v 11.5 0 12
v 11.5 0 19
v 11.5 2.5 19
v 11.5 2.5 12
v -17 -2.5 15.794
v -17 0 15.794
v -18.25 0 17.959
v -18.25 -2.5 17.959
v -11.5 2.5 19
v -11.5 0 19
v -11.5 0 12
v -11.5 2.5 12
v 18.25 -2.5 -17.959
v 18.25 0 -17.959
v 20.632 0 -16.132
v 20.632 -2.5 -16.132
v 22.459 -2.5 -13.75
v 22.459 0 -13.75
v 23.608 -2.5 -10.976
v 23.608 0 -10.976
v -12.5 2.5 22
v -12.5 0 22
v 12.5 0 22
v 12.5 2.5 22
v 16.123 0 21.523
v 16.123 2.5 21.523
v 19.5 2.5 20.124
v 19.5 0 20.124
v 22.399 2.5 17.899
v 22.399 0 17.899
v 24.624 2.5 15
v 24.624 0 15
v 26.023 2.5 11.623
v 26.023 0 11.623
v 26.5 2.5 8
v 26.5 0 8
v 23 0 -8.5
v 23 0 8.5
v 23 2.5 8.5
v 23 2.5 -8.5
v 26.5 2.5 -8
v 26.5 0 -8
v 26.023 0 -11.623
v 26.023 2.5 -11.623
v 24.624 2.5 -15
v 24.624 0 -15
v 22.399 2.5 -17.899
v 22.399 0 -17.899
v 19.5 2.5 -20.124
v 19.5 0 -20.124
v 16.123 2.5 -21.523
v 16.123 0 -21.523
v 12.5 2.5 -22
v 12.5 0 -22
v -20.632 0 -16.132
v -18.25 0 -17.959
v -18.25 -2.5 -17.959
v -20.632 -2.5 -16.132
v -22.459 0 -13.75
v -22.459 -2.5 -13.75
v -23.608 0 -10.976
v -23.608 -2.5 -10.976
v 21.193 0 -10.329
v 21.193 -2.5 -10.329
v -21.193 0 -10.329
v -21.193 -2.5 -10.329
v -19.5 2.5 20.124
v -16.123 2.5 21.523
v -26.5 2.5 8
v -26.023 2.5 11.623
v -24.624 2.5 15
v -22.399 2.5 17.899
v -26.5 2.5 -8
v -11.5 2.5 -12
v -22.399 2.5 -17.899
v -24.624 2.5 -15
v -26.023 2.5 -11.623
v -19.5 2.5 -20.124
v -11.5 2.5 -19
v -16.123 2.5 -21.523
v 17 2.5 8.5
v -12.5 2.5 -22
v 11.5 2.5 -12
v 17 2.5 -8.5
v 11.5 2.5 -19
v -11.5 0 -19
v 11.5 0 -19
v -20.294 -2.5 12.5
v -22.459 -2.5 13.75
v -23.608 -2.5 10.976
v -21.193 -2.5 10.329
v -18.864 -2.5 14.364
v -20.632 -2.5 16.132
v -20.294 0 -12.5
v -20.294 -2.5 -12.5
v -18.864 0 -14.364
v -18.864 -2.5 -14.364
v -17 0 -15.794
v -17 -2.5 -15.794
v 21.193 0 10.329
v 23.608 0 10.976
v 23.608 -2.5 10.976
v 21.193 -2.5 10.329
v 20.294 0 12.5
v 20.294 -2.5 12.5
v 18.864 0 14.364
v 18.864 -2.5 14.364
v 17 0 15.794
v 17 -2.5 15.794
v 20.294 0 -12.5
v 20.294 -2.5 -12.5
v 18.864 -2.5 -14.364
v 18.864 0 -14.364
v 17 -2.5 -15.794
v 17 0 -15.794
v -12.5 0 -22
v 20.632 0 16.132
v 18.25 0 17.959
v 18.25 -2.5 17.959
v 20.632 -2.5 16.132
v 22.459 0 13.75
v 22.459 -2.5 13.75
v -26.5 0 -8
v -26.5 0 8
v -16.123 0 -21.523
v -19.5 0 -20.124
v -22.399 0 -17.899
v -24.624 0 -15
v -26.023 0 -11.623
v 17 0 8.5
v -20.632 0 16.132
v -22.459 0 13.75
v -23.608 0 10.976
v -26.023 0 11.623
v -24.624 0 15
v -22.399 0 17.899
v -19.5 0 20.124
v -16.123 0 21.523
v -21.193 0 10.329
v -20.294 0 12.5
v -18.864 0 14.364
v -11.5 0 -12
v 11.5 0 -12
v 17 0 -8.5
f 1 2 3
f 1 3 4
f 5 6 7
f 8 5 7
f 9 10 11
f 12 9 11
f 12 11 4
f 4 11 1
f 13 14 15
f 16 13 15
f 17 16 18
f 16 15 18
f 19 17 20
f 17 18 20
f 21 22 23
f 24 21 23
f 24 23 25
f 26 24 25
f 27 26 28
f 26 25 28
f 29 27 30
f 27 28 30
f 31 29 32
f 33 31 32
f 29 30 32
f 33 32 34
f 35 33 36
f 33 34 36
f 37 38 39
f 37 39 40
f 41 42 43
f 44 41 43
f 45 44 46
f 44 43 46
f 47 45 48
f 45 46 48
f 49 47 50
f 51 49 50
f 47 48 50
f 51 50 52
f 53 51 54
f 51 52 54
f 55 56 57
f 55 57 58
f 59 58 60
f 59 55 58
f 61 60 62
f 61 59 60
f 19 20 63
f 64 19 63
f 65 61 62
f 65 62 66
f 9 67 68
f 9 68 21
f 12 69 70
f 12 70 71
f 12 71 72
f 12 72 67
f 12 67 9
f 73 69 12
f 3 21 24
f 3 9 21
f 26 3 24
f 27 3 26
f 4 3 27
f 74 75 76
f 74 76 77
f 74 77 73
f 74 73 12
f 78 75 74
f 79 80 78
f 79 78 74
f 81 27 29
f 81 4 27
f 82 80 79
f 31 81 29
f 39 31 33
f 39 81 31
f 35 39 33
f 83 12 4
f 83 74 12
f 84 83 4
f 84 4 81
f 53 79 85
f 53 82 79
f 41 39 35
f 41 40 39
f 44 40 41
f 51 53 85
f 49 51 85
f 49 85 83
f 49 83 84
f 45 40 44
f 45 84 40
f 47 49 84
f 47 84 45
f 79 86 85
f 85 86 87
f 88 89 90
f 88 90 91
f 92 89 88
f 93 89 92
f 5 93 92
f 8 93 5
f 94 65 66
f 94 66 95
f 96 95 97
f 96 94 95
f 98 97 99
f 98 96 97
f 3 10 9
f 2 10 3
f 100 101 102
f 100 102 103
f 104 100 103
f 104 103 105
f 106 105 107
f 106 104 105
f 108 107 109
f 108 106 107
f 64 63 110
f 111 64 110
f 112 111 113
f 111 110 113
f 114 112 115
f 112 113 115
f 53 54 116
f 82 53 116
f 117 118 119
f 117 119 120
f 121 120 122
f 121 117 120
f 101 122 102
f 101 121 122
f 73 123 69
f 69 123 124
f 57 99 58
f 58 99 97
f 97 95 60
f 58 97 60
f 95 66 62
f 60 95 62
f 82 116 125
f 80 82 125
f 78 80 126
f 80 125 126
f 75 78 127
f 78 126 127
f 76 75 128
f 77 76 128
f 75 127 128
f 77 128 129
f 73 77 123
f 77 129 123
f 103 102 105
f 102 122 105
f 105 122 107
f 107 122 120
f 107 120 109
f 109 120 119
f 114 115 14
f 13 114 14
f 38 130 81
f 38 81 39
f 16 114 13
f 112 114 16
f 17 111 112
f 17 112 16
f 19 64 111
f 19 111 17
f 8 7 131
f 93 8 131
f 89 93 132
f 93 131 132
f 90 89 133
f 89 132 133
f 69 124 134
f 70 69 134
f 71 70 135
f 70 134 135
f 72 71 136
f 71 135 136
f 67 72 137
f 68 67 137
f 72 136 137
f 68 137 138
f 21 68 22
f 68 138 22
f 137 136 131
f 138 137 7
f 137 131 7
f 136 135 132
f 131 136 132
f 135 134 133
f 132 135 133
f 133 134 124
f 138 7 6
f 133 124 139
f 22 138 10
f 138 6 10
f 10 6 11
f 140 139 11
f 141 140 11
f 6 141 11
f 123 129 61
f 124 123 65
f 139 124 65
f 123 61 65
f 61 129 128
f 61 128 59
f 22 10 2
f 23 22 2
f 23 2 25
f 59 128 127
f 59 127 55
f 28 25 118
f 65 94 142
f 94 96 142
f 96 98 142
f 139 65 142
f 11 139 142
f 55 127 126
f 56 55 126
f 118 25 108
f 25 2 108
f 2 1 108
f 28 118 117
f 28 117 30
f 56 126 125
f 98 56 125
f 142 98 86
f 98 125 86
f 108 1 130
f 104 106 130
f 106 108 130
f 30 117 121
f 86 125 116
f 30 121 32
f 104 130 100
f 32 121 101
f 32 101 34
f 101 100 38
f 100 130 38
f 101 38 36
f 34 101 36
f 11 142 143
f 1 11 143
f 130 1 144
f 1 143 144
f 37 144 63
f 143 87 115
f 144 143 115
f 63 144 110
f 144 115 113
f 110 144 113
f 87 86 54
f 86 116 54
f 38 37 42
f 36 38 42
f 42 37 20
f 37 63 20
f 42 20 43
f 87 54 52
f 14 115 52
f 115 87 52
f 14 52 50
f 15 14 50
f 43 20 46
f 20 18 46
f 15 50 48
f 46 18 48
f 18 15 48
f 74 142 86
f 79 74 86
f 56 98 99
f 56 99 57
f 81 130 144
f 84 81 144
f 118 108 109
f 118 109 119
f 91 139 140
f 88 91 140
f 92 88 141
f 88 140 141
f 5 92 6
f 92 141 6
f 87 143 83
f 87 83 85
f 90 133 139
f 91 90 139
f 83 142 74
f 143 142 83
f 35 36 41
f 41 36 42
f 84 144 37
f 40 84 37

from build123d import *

# Parameters (mm, degrees)
SKETCH1_W           = 23
SKETCH1_H           = 7
SKETCH1_W_2         = 6
SKETCH1_H_2         = 17
BOSS_EXTRUDE1_DEPTH = 2.5
BOSS_EXTRUDE2_DEPTH = 2.5


with BuildPart() as part:
    # Sketch1 → Boss-Extrude1 (new body)
    with BuildSketch(Plane(origin=(0, 0, 0), x_dir=(1, 0, 0), z_dir=(0, 1, 0))):
        with BuildLine():
            Line((-26.5, 8), (-26.5, -8))
            ThreePointArc((-26.5, -8), (-22.399494937, -17.899494937), (-12.5, -22))
            Line((-12.5, -22), (12.5, -22))
            ThreePointArc((12.5, -22), (22.399494937, -17.899494937), (26.5, -8))
            Line((26.5, -8), (26.5, 8))
            ThreePointArc((26.5, 8), (22.399494937, 17.899494937), (12.5, 22))
            Line((12.5, 22), (-12.5, 22))
            ThreePointArc((-12.5, 22), (-22.399494937, 17.899494937), (-26.5, 8))
        make_face()
        with Locations((0, -15.5)):
            Rectangle(SKETCH1_W, SKETCH1_H, mode=Mode.SUBTRACT)
        with Locations((20, 0)):
            Rectangle(SKETCH1_W_2, SKETCH1_H_2, mode=Mode.SUBTRACT)
        with Locations((0, 15.5)):
            Rectangle(SKETCH1_W, SKETCH1_H, mode=Mode.SUBTRACT)
    extrude(amount=BOSS_EXTRUDE1_DEPTH)

    # Sketch2 → Boss-Extrude2 (add)
    with BuildSketch(Plane.XZ):
        with BuildLine():
            Line((-17, 15.794228634), (-18.25, 17.959292144))
            ThreePointArc((-18.25, 17.959292144), (-21.623563413, 15.000756434), (-23.608147002, 10.976419019))
            Line((-23.608147002, 10.976419019), (-21.193332437, 10.329371406))
            ThreePointArc((-21.193332437, 10.329371406), (-19.640180063, 13.478852861), (-17, 15.794228634))
        make_face()
        with BuildLine():
            Line((23.608147002, 10.976419019), (21.193332437, 10.329371406))
            ThreePointArc((21.193332437, 10.329371406), (19.640180063, 13.478852861), (17, 15.794228634))
            Line((17, 15.794228634), (18.25, 17.959292144))
            ThreePointArc((18.25, 17.959292144), (21.623563413, 15.000756434), (23.608147002, 10.976419019))
        make_face()
        with BuildLine():
            Line((17, -15.794228634), (18.25, -17.959292144))
            ThreePointArc((18.25, -17.959292144), (21.623563413, -15.000756434), (23.608147002, -10.976419019))
            Line((23.608147002, -10.976419019), (21.193332437, -10.329371406))
            ThreePointArc((21.193332437, -10.329371406), (19.640180063, -13.478852861), (17, -15.794228634))
        make_face()
        with BuildLine():
            Line((-23.608147002, -10.976419019), (-21.193332437, -10.329371406))
            ThreePointArc((-21.193332437, -10.329371406), (-19.640180063, -13.478852861), (-17, -15.794228634))
            Line((-17, -15.794228634), (-18.25, -17.959292144))
            ThreePointArc((-18.25, -17.959292144), (-21.623563413, -15.000756434), (-23.608147002, -10.976419019))
        make_face()
    extrude(amount=BOSS_EXTRUDE2_DEPTH)


solid = part.part
